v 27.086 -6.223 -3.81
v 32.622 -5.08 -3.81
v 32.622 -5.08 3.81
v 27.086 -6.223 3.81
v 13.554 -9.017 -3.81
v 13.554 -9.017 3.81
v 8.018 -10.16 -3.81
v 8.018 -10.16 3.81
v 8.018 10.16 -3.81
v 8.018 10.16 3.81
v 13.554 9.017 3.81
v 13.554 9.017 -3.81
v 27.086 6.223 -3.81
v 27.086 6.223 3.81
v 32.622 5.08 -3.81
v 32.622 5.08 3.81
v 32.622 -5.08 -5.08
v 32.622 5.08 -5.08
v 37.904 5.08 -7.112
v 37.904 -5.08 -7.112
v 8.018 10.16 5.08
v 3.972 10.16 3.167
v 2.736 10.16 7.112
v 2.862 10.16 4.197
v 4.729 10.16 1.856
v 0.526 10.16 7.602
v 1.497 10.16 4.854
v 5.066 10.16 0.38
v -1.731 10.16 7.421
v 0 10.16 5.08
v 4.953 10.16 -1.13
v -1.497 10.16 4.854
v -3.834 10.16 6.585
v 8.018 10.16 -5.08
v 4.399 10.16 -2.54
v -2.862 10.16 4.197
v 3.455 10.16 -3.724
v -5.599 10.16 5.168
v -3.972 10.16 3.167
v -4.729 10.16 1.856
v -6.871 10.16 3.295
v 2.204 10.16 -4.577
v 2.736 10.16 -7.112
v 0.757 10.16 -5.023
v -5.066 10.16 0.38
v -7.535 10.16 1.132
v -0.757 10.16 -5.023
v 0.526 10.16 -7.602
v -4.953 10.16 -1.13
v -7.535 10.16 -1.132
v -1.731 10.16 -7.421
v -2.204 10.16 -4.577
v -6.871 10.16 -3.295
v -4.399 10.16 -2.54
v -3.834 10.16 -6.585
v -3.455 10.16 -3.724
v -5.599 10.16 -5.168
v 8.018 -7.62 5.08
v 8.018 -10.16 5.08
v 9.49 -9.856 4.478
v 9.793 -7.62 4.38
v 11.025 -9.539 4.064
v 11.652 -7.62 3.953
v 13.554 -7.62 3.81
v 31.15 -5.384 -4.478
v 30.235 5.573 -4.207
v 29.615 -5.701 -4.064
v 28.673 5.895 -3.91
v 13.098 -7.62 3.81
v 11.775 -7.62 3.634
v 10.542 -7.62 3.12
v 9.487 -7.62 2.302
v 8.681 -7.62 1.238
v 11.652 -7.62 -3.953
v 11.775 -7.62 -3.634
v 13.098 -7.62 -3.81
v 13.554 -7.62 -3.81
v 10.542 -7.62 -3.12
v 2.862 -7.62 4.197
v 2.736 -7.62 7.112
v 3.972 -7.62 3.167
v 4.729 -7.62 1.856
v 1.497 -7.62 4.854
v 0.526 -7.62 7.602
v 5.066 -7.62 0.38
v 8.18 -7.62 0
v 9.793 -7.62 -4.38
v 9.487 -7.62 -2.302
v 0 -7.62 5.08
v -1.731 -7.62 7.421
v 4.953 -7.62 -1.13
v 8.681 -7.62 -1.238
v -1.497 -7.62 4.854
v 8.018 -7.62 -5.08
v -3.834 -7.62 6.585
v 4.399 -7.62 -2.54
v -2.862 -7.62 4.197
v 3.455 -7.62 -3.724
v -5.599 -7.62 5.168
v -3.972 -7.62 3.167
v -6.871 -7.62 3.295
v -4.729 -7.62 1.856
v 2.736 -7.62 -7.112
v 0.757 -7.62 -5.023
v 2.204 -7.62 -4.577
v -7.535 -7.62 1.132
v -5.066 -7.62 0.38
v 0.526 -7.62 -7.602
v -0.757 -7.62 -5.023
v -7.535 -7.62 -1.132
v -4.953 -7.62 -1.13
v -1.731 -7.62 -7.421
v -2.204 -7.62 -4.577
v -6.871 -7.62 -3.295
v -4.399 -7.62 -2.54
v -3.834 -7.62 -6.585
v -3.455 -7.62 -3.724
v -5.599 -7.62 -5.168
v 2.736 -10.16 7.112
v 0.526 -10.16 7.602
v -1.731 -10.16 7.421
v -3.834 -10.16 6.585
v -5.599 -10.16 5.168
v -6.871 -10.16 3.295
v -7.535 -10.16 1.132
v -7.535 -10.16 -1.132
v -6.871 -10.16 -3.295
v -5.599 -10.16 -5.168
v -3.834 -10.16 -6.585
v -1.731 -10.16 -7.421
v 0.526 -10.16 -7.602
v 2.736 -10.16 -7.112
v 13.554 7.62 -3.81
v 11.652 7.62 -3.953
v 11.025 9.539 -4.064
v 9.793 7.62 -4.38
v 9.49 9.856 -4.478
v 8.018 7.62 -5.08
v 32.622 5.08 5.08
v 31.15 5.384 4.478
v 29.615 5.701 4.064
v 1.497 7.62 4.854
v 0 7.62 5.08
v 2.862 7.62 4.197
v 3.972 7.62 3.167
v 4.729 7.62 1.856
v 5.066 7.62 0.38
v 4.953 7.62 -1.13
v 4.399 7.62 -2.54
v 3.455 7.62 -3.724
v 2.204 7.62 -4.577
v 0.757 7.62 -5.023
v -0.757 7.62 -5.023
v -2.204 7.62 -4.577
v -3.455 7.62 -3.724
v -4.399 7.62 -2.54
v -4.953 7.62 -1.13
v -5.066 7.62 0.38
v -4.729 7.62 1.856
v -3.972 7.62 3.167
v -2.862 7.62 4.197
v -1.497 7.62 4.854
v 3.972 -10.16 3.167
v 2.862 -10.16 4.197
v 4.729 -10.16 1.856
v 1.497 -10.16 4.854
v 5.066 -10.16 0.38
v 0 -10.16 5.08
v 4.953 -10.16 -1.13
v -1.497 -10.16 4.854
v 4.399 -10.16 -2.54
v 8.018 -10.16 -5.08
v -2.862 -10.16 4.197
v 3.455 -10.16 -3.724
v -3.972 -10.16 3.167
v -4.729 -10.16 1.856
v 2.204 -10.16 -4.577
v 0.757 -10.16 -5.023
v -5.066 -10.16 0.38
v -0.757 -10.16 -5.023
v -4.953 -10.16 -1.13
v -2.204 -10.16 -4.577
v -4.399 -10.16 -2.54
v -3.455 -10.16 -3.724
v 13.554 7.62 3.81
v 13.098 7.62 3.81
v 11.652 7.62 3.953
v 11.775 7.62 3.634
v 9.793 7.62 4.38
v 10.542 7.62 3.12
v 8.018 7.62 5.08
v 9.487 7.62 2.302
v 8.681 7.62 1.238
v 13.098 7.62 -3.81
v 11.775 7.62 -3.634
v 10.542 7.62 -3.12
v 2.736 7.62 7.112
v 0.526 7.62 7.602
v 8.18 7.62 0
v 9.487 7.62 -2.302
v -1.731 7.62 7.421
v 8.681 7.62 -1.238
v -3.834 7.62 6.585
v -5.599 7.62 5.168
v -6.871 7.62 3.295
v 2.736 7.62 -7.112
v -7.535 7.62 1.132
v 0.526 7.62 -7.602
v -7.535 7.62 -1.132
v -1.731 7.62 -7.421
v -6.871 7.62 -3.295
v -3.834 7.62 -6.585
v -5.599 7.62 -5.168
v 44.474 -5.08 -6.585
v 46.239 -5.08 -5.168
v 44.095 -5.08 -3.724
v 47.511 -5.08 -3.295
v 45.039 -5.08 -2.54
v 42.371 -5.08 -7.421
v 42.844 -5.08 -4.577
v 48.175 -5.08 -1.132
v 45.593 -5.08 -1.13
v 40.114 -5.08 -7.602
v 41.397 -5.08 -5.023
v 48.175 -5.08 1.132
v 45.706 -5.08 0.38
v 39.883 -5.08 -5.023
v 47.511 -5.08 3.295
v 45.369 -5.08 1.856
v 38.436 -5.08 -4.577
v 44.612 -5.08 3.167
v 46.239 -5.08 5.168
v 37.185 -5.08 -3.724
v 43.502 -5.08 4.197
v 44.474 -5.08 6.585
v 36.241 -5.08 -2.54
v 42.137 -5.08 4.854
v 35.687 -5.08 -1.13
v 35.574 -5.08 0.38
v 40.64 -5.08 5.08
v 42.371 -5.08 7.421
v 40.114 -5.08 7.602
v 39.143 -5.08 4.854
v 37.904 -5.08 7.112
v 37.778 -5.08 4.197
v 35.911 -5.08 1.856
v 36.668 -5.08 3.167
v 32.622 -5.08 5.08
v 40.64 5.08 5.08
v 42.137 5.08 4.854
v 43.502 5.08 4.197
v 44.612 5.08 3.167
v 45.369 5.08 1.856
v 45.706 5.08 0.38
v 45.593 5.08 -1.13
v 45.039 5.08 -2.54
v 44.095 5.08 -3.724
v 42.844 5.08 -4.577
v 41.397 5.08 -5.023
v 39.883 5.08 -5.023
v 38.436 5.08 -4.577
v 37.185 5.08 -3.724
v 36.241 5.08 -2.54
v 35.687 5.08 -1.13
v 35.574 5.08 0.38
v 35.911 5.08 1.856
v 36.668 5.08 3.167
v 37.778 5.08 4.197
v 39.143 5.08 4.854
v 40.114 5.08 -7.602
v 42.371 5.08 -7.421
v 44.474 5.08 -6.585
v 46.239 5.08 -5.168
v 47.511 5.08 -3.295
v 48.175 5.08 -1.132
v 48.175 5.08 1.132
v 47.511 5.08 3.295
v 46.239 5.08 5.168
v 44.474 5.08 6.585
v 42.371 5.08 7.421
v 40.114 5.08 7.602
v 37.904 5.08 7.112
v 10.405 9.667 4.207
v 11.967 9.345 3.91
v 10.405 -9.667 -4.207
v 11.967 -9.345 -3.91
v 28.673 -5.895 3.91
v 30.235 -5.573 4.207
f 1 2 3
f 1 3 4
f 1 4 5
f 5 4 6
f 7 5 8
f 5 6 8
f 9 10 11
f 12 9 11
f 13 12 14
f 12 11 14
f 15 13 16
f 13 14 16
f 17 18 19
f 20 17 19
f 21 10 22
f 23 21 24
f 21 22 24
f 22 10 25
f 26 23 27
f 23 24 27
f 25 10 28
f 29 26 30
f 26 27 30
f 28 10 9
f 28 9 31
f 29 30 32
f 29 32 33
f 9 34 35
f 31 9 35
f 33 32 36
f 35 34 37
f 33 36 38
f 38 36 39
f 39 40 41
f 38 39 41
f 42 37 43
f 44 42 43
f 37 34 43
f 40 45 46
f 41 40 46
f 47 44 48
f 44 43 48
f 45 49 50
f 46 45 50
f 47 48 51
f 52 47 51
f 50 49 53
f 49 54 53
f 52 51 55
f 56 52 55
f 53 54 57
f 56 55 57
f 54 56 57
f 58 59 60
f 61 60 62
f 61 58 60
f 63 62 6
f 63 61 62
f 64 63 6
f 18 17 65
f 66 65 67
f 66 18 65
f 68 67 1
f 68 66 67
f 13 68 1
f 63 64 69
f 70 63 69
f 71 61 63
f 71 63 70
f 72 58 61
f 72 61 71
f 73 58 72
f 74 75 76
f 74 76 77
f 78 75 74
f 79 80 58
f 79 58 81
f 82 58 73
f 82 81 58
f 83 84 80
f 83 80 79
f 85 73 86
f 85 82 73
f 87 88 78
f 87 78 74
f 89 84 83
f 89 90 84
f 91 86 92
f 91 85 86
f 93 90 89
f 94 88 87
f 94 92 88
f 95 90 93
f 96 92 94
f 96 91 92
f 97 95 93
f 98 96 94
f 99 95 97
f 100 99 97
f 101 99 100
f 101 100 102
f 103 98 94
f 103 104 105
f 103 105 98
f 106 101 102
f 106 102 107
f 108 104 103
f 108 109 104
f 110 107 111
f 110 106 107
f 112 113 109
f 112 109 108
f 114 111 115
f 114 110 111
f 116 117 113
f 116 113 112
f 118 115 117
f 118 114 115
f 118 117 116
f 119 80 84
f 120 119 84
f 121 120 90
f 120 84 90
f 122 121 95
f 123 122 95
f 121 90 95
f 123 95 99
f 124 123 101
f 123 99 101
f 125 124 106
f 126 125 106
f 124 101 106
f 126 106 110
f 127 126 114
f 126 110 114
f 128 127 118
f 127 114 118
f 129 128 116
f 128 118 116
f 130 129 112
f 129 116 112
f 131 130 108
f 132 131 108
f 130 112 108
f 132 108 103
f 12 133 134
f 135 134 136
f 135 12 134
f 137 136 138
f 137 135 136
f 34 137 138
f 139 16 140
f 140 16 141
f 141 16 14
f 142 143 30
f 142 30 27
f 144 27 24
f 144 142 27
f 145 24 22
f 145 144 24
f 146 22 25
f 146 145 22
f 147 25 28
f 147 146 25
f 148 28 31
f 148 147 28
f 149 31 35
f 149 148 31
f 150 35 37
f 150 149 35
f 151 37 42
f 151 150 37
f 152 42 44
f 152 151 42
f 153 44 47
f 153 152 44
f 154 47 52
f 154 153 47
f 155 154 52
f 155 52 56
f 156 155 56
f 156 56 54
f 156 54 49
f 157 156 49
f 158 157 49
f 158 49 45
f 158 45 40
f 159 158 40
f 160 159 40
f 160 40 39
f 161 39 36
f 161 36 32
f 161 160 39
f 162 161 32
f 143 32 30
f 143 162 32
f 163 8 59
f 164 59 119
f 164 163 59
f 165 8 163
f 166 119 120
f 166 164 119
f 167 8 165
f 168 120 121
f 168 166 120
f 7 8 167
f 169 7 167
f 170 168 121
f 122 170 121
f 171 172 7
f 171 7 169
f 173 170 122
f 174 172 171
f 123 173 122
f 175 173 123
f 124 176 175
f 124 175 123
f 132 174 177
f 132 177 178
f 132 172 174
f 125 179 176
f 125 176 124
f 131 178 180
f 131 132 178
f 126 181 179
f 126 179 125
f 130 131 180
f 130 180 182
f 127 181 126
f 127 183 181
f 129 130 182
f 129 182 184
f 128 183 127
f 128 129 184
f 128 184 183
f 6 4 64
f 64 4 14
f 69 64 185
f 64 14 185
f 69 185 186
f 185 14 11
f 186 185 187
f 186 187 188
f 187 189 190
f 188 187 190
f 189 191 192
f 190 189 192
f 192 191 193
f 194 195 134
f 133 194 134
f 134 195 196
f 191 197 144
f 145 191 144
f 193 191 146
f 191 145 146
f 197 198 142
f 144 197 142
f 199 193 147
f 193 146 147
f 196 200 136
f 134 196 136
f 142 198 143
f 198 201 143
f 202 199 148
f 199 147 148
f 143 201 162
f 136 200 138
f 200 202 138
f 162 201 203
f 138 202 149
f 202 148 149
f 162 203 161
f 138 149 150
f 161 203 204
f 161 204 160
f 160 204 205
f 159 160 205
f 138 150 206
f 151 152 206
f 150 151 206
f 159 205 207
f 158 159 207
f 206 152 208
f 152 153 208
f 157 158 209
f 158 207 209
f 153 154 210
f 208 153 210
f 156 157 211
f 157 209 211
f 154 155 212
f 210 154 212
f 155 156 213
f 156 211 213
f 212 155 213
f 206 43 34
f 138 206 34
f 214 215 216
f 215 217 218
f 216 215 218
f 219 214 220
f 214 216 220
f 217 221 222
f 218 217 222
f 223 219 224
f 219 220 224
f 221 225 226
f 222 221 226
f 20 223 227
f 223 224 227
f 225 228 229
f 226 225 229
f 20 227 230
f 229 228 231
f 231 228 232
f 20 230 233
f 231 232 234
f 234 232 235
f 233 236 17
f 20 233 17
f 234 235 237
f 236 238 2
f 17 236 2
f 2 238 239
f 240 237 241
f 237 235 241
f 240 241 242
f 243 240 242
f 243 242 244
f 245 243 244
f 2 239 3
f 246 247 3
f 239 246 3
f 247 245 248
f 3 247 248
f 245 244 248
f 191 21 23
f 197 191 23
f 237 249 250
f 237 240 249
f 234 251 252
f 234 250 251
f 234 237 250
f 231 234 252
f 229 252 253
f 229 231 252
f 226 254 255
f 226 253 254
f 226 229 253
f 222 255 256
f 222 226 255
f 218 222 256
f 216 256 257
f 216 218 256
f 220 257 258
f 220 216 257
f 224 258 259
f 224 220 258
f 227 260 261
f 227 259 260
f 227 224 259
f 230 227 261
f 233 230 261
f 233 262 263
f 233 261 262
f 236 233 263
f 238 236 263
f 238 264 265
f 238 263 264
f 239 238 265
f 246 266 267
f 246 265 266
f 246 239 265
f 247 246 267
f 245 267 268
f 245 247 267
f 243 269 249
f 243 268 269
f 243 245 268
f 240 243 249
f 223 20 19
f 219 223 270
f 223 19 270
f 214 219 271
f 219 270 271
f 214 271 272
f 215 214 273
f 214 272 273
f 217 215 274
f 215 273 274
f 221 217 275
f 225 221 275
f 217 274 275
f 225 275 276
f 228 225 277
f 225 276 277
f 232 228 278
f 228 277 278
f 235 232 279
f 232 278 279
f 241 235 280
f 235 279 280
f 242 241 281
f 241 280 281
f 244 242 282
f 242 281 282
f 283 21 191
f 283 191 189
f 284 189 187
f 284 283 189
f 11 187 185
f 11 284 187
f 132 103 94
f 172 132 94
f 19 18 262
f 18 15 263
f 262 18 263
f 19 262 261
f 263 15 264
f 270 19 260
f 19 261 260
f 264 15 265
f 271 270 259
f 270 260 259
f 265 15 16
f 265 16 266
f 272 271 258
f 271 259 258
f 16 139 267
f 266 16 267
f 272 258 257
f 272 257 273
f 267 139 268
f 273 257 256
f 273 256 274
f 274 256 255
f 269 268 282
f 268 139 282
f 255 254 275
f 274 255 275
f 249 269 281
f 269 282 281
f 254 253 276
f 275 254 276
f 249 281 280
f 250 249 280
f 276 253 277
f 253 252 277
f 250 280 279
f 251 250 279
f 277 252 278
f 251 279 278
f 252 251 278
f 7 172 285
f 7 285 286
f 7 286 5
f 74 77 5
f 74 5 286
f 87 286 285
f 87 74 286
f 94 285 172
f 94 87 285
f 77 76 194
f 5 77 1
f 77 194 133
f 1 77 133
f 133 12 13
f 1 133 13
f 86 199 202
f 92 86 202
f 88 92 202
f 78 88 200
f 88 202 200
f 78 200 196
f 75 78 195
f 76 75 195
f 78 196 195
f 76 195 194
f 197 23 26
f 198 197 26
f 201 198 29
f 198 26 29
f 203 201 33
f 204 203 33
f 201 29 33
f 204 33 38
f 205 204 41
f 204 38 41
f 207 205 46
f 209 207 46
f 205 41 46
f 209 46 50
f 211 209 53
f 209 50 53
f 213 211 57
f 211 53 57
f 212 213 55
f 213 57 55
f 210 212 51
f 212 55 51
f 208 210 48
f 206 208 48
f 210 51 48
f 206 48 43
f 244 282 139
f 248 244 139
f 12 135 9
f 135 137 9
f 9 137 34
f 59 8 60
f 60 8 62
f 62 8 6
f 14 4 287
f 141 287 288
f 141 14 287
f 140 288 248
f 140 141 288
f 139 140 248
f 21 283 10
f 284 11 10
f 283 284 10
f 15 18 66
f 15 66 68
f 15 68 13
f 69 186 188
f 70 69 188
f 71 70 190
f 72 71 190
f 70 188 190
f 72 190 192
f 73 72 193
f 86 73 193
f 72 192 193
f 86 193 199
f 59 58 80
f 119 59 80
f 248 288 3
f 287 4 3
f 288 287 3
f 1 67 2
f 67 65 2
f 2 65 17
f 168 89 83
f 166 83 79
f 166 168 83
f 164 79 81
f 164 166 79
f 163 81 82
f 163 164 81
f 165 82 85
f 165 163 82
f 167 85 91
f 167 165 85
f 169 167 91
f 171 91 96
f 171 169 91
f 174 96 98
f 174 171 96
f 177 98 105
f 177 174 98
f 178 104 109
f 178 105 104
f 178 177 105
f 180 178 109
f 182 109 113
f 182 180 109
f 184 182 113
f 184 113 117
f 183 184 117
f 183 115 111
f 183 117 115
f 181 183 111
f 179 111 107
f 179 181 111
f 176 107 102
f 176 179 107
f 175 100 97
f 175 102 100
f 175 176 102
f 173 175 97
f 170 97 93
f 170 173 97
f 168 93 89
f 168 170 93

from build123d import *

# Parameters (mm, degrees)
SKETCH1_R           = 5.08
BOSS_EXTRUDE1_DEPTH = 10.16
SKETCH2_W           = 15.638324702
SKETCH2_H           = 15.24
CUT_EXTRUDE1_DEPTH  = 54.836616721
FILLET1_R           = 12.7
FILLET2_R           = 5.08


with BuildPart() as part:
    # Sketch1 → Boss-Extrude1 (new, symmetric)
    with BuildSketch(Plane(origin=(0, 0, 0), x_dir=(1, 0, 0), z_dir=(0, 1, 0))):
        with BuildLine():
            Line((2.735663722, 7.112), (8.018324702, 5.08))
            Line((8.018324702, 5.08), (8.018324702, 3.81))
            Line((8.018324702, 3.81), (32.621675298, 3.81))
            Line((32.621675298, 3.81), (32.621675298, 5.08))
            Line((32.621675298, 5.08), (37.904336278, 7.112))
            ThreePointArc((37.904336278, 7.112), (48.26, 0), (37.904336278, -7.112))
            Line((37.904336278, -7.112), (32.621675298, -5.08))
            Line((32.621675298, -5.08), (32.621675298, -3.81))
            Line((32.621675298, -3.81), (8.018324702, -3.81))
            Line((8.018324702, -3.81), (8.018324702, -5.08))
            Line((8.018324702, -5.08), (2.735663722, -7.112))
            ThreePointArc((2.735663722, -7.112), (-7.62, 0), (2.735663722, 7.112))
        make_face()
        with Locations(Location((0, 0, 0), (0, 0, 270))):
            Circle(SKETCH1_R, mode=Mode.SUBTRACT)
        with Locations(Location((40.64, 0, 0), (0, 0, 270))):
            Circle(SKETCH1_R, mode=Mode.SUBTRACT)
    extrude(amount=BOSS_EXTRUDE1_DEPTH, both=True)

    # Sketch2 → Cut-Extrude1 (cut, through all)
    with BuildSketch(Plane.XY.offset(13.97)):
        Polygon((8.018324702, 10.16), (32.621675298, 5.08), (48.26, 5.08), (48.26, 10.16), align=None)
        with Locations((0.199162351, 0)):
            Rectangle(SKETCH2_W, SKETCH2_H)
        Polygon((48.26, -10.16), (48.26, -5.08), (32.621675298, -5.08), (8.018324702, -10.16), align=None)
    extrude(amount=-CUT_EXTRUDE1_DEPTH, mode=Mode.SUBTRACT)

    # Fillet1
    # the kernel refuses this fillet: 12.7 mm, written as the material it adds along each edge
    with BuildSketch(Plane(origin=(32.621675298, 18.919504146, 3.81), x_dir=(-1, 0, 0), z_dir=(0, -1, 0))) as fillet1_piece_1_section:
        with BuildLine():
            CenterArc((5.535801658, -12.7), FILLET1_R, 90, 25.841932763)
            Line((0, -1.27), (0, 0))
            Line((0, 0), (5.535801658, 0))
        make_face()
    fillet1_piece_1 = extrude(amount=37.839008291, mode=Mode.PRIVATE)
    fillet1_piece_1 = split(fillet1_piece_1, bisect_by=Plane(origin=(37.374376864, -4.098681465, 3.81), z_dir=(-0.20221057606968723, 0.9793420663514691, 0)), keep=Keep.TOP, mode=Mode.PRIVATE)
    fillet1_piece_1 = split(fillet1_piece_1, bisect_by=Plane(origin=(29.880992297, 5.645885105, 3.81), z_dir=(-0.20221057606968723, -0.9793420663514691, 0)), keep=Keep.TOP, mode=Mode.PRIVATE)
    add(fillet1_piece_1)
    with BuildSketch(Plane(origin=(32.621675298, 18.919504146, -3.81), x_dir=(-1, 0, 0), z_dir=(0, -1, 0))) as fillet1_piece_2_section:
        with BuildLine():
            CenterArc((5.535801658, 12.7), FILLET1_R, 244.158067237, 25.841932763)
            Line((0, 1.27), (0, 0))
            Line((0, 0), (5.535801658, 0))
        make_face()
    fillet1_piece_2 = extrude(amount=37.839008291, mode=Mode.PRIVATE)
    fillet1_piece_2 = split(fillet1_piece_2, bisect_by=Plane(origin=(37.374376864, -4.098681465, -3.81), z_dir=(-0.20221057606968723, 0.9793420663514691, 0)), keep=Keep.TOP, mode=Mode.PRIVATE)
    fillet1_piece_2 = split(fillet1_piece_2, bisect_by=Plane(origin=(29.880992297, 5.645885105, -3.81), z_dir=(-0.20221057606968723, -0.9793420663514691, 0)), keep=Keep.TOP, mode=Mode.PRIVATE)
    add(fillet1_piece_2)
    with BuildSketch(Plane(origin=(8.018324702, -7.62, -3.81), x_dir=(1, 0, 0), z_dir=(0, -1, 0))) as fillet1_piece_3_section:
        with BuildLine():
            CenterArc((5.535801658, -12.7), FILLET1_R, 90, 25.841932763)
            Line((0, -1.27), (0, 0))
            Line((0, 0), (5.535801658, 0))
        make_face()
    fillet1_piece_3 = extrude(amount=16.379504146, mode=Mode.PRIVATE)
    fillet1_piece_3 = split(fillet1_piece_3, bisect_by=Plane(origin=(8.521329344, -10.056141643, -3.81), z_dir=(-0.20221057606968723, 0.9793420663514691, 0)), keep=Keep.TOP, mode=Mode.PRIVATE)
    add(fillet1_piece_3)
    with BuildSketch(Plane(origin=(8.018324702, 23.999504146, -3.81), x_dir=(1, 0, 0), z_dir=(0, -1, 0))) as fillet1_piece_4_section:
        with BuildLine():
            CenterArc((5.535801658, -12.7), FILLET1_R, 90, 25.841932763)
            Line((0, -1.27), (0, 0))
            Line((0, 0), (5.535801658, 0))
        make_face()
    fillet1_piece_4 = extrude(amount=16.379504146, mode=Mode.PRIVATE)
    fillet1_piece_4 = split(fillet1_piece_4, bisect_by=Plane(origin=(5.277641702, 10.725885105, -3.81), z_dir=(-0.20221057606968723, -0.9793420663514691, 0)), keep=Keep.TOP, mode=Mode.PRIVATE)
    add(fillet1_piece_4)
    with BuildSketch(Plane(origin=(8.018324702, -7.62, 3.81), x_dir=(0, 0, 1), z_dir=(0, -1, 0))) as fillet1_piece_5_section:
        with BuildLine():
            CenterArc((12.7, -5.535801658), FILLET1_R, 154.158067237, 25.841932763)
            Line((0, -5.535801658), (0, 0))
            Line((0, 0), (1.27, 0))
        make_face()
    fillet1_piece_5 = extrude(amount=16.379504146, mode=Mode.PRIVATE)
    fillet1_piece_5 = split(fillet1_piece_5, bisect_by=Plane(origin=(8.521329344, -10.056141643, 3.81), z_dir=(-0.20221057606968723, 0.9793420663514691, 0)), keep=Keep.TOP, mode=Mode.PRIVATE)
    add(fillet1_piece_5)
    with BuildSketch(Plane(origin=(8.018324702, 23.999504146, 3.81), x_dir=(0, 0, 1), z_dir=(0, -1, 0))) as fillet1_piece_6_section:
        with BuildLine():
            CenterArc((12.7, -5.535801658), FILLET1_R, 154.158067237, 25.841932763)
            Line((0, -5.535801658), (0, 0))
            Line((0, 0), (1.27, 0))
        make_face()
    fillet1_piece_6 = extrude(amount=16.379504146, mode=Mode.PRIVATE)
    fillet1_piece_6 = split(fillet1_piece_6, bisect_by=Plane(origin=(5.277641702, 10.725885105, 3.81), z_dir=(-0.20221057606968723, -0.9793420663514691, 0)), keep=Keep.TOP, mode=Mode.PRIVATE)
    add(fillet1_piece_6)

    # Fillet2
    # the kernel refuses this fillet: 5.08 mm, written as the material it takes off along each edge
    with BuildSketch(Plane(origin=(8.018324702, 7.62, -3.81), x_dir=(1, 0, 0), z_dir=(0, -1, 0)), Plane(origin=(8.018324702, 7.62, 3.81), x_dir=(0, 0, -1), z_dir=(0, -1, 0))) as fillet2_piece_1:
        with BuildLine():
            CenterArc((FILLET2_R, FILLET2_R), FILLET2_R, 180, 90)
            Line((0, FILLET2_R), (0, 0))
            Line((0, 0), (FILLET2_R, 0))
        make_face()
    extrude(amount=15.24, mode=Mode.SUBTRACT)


solid = part.part
